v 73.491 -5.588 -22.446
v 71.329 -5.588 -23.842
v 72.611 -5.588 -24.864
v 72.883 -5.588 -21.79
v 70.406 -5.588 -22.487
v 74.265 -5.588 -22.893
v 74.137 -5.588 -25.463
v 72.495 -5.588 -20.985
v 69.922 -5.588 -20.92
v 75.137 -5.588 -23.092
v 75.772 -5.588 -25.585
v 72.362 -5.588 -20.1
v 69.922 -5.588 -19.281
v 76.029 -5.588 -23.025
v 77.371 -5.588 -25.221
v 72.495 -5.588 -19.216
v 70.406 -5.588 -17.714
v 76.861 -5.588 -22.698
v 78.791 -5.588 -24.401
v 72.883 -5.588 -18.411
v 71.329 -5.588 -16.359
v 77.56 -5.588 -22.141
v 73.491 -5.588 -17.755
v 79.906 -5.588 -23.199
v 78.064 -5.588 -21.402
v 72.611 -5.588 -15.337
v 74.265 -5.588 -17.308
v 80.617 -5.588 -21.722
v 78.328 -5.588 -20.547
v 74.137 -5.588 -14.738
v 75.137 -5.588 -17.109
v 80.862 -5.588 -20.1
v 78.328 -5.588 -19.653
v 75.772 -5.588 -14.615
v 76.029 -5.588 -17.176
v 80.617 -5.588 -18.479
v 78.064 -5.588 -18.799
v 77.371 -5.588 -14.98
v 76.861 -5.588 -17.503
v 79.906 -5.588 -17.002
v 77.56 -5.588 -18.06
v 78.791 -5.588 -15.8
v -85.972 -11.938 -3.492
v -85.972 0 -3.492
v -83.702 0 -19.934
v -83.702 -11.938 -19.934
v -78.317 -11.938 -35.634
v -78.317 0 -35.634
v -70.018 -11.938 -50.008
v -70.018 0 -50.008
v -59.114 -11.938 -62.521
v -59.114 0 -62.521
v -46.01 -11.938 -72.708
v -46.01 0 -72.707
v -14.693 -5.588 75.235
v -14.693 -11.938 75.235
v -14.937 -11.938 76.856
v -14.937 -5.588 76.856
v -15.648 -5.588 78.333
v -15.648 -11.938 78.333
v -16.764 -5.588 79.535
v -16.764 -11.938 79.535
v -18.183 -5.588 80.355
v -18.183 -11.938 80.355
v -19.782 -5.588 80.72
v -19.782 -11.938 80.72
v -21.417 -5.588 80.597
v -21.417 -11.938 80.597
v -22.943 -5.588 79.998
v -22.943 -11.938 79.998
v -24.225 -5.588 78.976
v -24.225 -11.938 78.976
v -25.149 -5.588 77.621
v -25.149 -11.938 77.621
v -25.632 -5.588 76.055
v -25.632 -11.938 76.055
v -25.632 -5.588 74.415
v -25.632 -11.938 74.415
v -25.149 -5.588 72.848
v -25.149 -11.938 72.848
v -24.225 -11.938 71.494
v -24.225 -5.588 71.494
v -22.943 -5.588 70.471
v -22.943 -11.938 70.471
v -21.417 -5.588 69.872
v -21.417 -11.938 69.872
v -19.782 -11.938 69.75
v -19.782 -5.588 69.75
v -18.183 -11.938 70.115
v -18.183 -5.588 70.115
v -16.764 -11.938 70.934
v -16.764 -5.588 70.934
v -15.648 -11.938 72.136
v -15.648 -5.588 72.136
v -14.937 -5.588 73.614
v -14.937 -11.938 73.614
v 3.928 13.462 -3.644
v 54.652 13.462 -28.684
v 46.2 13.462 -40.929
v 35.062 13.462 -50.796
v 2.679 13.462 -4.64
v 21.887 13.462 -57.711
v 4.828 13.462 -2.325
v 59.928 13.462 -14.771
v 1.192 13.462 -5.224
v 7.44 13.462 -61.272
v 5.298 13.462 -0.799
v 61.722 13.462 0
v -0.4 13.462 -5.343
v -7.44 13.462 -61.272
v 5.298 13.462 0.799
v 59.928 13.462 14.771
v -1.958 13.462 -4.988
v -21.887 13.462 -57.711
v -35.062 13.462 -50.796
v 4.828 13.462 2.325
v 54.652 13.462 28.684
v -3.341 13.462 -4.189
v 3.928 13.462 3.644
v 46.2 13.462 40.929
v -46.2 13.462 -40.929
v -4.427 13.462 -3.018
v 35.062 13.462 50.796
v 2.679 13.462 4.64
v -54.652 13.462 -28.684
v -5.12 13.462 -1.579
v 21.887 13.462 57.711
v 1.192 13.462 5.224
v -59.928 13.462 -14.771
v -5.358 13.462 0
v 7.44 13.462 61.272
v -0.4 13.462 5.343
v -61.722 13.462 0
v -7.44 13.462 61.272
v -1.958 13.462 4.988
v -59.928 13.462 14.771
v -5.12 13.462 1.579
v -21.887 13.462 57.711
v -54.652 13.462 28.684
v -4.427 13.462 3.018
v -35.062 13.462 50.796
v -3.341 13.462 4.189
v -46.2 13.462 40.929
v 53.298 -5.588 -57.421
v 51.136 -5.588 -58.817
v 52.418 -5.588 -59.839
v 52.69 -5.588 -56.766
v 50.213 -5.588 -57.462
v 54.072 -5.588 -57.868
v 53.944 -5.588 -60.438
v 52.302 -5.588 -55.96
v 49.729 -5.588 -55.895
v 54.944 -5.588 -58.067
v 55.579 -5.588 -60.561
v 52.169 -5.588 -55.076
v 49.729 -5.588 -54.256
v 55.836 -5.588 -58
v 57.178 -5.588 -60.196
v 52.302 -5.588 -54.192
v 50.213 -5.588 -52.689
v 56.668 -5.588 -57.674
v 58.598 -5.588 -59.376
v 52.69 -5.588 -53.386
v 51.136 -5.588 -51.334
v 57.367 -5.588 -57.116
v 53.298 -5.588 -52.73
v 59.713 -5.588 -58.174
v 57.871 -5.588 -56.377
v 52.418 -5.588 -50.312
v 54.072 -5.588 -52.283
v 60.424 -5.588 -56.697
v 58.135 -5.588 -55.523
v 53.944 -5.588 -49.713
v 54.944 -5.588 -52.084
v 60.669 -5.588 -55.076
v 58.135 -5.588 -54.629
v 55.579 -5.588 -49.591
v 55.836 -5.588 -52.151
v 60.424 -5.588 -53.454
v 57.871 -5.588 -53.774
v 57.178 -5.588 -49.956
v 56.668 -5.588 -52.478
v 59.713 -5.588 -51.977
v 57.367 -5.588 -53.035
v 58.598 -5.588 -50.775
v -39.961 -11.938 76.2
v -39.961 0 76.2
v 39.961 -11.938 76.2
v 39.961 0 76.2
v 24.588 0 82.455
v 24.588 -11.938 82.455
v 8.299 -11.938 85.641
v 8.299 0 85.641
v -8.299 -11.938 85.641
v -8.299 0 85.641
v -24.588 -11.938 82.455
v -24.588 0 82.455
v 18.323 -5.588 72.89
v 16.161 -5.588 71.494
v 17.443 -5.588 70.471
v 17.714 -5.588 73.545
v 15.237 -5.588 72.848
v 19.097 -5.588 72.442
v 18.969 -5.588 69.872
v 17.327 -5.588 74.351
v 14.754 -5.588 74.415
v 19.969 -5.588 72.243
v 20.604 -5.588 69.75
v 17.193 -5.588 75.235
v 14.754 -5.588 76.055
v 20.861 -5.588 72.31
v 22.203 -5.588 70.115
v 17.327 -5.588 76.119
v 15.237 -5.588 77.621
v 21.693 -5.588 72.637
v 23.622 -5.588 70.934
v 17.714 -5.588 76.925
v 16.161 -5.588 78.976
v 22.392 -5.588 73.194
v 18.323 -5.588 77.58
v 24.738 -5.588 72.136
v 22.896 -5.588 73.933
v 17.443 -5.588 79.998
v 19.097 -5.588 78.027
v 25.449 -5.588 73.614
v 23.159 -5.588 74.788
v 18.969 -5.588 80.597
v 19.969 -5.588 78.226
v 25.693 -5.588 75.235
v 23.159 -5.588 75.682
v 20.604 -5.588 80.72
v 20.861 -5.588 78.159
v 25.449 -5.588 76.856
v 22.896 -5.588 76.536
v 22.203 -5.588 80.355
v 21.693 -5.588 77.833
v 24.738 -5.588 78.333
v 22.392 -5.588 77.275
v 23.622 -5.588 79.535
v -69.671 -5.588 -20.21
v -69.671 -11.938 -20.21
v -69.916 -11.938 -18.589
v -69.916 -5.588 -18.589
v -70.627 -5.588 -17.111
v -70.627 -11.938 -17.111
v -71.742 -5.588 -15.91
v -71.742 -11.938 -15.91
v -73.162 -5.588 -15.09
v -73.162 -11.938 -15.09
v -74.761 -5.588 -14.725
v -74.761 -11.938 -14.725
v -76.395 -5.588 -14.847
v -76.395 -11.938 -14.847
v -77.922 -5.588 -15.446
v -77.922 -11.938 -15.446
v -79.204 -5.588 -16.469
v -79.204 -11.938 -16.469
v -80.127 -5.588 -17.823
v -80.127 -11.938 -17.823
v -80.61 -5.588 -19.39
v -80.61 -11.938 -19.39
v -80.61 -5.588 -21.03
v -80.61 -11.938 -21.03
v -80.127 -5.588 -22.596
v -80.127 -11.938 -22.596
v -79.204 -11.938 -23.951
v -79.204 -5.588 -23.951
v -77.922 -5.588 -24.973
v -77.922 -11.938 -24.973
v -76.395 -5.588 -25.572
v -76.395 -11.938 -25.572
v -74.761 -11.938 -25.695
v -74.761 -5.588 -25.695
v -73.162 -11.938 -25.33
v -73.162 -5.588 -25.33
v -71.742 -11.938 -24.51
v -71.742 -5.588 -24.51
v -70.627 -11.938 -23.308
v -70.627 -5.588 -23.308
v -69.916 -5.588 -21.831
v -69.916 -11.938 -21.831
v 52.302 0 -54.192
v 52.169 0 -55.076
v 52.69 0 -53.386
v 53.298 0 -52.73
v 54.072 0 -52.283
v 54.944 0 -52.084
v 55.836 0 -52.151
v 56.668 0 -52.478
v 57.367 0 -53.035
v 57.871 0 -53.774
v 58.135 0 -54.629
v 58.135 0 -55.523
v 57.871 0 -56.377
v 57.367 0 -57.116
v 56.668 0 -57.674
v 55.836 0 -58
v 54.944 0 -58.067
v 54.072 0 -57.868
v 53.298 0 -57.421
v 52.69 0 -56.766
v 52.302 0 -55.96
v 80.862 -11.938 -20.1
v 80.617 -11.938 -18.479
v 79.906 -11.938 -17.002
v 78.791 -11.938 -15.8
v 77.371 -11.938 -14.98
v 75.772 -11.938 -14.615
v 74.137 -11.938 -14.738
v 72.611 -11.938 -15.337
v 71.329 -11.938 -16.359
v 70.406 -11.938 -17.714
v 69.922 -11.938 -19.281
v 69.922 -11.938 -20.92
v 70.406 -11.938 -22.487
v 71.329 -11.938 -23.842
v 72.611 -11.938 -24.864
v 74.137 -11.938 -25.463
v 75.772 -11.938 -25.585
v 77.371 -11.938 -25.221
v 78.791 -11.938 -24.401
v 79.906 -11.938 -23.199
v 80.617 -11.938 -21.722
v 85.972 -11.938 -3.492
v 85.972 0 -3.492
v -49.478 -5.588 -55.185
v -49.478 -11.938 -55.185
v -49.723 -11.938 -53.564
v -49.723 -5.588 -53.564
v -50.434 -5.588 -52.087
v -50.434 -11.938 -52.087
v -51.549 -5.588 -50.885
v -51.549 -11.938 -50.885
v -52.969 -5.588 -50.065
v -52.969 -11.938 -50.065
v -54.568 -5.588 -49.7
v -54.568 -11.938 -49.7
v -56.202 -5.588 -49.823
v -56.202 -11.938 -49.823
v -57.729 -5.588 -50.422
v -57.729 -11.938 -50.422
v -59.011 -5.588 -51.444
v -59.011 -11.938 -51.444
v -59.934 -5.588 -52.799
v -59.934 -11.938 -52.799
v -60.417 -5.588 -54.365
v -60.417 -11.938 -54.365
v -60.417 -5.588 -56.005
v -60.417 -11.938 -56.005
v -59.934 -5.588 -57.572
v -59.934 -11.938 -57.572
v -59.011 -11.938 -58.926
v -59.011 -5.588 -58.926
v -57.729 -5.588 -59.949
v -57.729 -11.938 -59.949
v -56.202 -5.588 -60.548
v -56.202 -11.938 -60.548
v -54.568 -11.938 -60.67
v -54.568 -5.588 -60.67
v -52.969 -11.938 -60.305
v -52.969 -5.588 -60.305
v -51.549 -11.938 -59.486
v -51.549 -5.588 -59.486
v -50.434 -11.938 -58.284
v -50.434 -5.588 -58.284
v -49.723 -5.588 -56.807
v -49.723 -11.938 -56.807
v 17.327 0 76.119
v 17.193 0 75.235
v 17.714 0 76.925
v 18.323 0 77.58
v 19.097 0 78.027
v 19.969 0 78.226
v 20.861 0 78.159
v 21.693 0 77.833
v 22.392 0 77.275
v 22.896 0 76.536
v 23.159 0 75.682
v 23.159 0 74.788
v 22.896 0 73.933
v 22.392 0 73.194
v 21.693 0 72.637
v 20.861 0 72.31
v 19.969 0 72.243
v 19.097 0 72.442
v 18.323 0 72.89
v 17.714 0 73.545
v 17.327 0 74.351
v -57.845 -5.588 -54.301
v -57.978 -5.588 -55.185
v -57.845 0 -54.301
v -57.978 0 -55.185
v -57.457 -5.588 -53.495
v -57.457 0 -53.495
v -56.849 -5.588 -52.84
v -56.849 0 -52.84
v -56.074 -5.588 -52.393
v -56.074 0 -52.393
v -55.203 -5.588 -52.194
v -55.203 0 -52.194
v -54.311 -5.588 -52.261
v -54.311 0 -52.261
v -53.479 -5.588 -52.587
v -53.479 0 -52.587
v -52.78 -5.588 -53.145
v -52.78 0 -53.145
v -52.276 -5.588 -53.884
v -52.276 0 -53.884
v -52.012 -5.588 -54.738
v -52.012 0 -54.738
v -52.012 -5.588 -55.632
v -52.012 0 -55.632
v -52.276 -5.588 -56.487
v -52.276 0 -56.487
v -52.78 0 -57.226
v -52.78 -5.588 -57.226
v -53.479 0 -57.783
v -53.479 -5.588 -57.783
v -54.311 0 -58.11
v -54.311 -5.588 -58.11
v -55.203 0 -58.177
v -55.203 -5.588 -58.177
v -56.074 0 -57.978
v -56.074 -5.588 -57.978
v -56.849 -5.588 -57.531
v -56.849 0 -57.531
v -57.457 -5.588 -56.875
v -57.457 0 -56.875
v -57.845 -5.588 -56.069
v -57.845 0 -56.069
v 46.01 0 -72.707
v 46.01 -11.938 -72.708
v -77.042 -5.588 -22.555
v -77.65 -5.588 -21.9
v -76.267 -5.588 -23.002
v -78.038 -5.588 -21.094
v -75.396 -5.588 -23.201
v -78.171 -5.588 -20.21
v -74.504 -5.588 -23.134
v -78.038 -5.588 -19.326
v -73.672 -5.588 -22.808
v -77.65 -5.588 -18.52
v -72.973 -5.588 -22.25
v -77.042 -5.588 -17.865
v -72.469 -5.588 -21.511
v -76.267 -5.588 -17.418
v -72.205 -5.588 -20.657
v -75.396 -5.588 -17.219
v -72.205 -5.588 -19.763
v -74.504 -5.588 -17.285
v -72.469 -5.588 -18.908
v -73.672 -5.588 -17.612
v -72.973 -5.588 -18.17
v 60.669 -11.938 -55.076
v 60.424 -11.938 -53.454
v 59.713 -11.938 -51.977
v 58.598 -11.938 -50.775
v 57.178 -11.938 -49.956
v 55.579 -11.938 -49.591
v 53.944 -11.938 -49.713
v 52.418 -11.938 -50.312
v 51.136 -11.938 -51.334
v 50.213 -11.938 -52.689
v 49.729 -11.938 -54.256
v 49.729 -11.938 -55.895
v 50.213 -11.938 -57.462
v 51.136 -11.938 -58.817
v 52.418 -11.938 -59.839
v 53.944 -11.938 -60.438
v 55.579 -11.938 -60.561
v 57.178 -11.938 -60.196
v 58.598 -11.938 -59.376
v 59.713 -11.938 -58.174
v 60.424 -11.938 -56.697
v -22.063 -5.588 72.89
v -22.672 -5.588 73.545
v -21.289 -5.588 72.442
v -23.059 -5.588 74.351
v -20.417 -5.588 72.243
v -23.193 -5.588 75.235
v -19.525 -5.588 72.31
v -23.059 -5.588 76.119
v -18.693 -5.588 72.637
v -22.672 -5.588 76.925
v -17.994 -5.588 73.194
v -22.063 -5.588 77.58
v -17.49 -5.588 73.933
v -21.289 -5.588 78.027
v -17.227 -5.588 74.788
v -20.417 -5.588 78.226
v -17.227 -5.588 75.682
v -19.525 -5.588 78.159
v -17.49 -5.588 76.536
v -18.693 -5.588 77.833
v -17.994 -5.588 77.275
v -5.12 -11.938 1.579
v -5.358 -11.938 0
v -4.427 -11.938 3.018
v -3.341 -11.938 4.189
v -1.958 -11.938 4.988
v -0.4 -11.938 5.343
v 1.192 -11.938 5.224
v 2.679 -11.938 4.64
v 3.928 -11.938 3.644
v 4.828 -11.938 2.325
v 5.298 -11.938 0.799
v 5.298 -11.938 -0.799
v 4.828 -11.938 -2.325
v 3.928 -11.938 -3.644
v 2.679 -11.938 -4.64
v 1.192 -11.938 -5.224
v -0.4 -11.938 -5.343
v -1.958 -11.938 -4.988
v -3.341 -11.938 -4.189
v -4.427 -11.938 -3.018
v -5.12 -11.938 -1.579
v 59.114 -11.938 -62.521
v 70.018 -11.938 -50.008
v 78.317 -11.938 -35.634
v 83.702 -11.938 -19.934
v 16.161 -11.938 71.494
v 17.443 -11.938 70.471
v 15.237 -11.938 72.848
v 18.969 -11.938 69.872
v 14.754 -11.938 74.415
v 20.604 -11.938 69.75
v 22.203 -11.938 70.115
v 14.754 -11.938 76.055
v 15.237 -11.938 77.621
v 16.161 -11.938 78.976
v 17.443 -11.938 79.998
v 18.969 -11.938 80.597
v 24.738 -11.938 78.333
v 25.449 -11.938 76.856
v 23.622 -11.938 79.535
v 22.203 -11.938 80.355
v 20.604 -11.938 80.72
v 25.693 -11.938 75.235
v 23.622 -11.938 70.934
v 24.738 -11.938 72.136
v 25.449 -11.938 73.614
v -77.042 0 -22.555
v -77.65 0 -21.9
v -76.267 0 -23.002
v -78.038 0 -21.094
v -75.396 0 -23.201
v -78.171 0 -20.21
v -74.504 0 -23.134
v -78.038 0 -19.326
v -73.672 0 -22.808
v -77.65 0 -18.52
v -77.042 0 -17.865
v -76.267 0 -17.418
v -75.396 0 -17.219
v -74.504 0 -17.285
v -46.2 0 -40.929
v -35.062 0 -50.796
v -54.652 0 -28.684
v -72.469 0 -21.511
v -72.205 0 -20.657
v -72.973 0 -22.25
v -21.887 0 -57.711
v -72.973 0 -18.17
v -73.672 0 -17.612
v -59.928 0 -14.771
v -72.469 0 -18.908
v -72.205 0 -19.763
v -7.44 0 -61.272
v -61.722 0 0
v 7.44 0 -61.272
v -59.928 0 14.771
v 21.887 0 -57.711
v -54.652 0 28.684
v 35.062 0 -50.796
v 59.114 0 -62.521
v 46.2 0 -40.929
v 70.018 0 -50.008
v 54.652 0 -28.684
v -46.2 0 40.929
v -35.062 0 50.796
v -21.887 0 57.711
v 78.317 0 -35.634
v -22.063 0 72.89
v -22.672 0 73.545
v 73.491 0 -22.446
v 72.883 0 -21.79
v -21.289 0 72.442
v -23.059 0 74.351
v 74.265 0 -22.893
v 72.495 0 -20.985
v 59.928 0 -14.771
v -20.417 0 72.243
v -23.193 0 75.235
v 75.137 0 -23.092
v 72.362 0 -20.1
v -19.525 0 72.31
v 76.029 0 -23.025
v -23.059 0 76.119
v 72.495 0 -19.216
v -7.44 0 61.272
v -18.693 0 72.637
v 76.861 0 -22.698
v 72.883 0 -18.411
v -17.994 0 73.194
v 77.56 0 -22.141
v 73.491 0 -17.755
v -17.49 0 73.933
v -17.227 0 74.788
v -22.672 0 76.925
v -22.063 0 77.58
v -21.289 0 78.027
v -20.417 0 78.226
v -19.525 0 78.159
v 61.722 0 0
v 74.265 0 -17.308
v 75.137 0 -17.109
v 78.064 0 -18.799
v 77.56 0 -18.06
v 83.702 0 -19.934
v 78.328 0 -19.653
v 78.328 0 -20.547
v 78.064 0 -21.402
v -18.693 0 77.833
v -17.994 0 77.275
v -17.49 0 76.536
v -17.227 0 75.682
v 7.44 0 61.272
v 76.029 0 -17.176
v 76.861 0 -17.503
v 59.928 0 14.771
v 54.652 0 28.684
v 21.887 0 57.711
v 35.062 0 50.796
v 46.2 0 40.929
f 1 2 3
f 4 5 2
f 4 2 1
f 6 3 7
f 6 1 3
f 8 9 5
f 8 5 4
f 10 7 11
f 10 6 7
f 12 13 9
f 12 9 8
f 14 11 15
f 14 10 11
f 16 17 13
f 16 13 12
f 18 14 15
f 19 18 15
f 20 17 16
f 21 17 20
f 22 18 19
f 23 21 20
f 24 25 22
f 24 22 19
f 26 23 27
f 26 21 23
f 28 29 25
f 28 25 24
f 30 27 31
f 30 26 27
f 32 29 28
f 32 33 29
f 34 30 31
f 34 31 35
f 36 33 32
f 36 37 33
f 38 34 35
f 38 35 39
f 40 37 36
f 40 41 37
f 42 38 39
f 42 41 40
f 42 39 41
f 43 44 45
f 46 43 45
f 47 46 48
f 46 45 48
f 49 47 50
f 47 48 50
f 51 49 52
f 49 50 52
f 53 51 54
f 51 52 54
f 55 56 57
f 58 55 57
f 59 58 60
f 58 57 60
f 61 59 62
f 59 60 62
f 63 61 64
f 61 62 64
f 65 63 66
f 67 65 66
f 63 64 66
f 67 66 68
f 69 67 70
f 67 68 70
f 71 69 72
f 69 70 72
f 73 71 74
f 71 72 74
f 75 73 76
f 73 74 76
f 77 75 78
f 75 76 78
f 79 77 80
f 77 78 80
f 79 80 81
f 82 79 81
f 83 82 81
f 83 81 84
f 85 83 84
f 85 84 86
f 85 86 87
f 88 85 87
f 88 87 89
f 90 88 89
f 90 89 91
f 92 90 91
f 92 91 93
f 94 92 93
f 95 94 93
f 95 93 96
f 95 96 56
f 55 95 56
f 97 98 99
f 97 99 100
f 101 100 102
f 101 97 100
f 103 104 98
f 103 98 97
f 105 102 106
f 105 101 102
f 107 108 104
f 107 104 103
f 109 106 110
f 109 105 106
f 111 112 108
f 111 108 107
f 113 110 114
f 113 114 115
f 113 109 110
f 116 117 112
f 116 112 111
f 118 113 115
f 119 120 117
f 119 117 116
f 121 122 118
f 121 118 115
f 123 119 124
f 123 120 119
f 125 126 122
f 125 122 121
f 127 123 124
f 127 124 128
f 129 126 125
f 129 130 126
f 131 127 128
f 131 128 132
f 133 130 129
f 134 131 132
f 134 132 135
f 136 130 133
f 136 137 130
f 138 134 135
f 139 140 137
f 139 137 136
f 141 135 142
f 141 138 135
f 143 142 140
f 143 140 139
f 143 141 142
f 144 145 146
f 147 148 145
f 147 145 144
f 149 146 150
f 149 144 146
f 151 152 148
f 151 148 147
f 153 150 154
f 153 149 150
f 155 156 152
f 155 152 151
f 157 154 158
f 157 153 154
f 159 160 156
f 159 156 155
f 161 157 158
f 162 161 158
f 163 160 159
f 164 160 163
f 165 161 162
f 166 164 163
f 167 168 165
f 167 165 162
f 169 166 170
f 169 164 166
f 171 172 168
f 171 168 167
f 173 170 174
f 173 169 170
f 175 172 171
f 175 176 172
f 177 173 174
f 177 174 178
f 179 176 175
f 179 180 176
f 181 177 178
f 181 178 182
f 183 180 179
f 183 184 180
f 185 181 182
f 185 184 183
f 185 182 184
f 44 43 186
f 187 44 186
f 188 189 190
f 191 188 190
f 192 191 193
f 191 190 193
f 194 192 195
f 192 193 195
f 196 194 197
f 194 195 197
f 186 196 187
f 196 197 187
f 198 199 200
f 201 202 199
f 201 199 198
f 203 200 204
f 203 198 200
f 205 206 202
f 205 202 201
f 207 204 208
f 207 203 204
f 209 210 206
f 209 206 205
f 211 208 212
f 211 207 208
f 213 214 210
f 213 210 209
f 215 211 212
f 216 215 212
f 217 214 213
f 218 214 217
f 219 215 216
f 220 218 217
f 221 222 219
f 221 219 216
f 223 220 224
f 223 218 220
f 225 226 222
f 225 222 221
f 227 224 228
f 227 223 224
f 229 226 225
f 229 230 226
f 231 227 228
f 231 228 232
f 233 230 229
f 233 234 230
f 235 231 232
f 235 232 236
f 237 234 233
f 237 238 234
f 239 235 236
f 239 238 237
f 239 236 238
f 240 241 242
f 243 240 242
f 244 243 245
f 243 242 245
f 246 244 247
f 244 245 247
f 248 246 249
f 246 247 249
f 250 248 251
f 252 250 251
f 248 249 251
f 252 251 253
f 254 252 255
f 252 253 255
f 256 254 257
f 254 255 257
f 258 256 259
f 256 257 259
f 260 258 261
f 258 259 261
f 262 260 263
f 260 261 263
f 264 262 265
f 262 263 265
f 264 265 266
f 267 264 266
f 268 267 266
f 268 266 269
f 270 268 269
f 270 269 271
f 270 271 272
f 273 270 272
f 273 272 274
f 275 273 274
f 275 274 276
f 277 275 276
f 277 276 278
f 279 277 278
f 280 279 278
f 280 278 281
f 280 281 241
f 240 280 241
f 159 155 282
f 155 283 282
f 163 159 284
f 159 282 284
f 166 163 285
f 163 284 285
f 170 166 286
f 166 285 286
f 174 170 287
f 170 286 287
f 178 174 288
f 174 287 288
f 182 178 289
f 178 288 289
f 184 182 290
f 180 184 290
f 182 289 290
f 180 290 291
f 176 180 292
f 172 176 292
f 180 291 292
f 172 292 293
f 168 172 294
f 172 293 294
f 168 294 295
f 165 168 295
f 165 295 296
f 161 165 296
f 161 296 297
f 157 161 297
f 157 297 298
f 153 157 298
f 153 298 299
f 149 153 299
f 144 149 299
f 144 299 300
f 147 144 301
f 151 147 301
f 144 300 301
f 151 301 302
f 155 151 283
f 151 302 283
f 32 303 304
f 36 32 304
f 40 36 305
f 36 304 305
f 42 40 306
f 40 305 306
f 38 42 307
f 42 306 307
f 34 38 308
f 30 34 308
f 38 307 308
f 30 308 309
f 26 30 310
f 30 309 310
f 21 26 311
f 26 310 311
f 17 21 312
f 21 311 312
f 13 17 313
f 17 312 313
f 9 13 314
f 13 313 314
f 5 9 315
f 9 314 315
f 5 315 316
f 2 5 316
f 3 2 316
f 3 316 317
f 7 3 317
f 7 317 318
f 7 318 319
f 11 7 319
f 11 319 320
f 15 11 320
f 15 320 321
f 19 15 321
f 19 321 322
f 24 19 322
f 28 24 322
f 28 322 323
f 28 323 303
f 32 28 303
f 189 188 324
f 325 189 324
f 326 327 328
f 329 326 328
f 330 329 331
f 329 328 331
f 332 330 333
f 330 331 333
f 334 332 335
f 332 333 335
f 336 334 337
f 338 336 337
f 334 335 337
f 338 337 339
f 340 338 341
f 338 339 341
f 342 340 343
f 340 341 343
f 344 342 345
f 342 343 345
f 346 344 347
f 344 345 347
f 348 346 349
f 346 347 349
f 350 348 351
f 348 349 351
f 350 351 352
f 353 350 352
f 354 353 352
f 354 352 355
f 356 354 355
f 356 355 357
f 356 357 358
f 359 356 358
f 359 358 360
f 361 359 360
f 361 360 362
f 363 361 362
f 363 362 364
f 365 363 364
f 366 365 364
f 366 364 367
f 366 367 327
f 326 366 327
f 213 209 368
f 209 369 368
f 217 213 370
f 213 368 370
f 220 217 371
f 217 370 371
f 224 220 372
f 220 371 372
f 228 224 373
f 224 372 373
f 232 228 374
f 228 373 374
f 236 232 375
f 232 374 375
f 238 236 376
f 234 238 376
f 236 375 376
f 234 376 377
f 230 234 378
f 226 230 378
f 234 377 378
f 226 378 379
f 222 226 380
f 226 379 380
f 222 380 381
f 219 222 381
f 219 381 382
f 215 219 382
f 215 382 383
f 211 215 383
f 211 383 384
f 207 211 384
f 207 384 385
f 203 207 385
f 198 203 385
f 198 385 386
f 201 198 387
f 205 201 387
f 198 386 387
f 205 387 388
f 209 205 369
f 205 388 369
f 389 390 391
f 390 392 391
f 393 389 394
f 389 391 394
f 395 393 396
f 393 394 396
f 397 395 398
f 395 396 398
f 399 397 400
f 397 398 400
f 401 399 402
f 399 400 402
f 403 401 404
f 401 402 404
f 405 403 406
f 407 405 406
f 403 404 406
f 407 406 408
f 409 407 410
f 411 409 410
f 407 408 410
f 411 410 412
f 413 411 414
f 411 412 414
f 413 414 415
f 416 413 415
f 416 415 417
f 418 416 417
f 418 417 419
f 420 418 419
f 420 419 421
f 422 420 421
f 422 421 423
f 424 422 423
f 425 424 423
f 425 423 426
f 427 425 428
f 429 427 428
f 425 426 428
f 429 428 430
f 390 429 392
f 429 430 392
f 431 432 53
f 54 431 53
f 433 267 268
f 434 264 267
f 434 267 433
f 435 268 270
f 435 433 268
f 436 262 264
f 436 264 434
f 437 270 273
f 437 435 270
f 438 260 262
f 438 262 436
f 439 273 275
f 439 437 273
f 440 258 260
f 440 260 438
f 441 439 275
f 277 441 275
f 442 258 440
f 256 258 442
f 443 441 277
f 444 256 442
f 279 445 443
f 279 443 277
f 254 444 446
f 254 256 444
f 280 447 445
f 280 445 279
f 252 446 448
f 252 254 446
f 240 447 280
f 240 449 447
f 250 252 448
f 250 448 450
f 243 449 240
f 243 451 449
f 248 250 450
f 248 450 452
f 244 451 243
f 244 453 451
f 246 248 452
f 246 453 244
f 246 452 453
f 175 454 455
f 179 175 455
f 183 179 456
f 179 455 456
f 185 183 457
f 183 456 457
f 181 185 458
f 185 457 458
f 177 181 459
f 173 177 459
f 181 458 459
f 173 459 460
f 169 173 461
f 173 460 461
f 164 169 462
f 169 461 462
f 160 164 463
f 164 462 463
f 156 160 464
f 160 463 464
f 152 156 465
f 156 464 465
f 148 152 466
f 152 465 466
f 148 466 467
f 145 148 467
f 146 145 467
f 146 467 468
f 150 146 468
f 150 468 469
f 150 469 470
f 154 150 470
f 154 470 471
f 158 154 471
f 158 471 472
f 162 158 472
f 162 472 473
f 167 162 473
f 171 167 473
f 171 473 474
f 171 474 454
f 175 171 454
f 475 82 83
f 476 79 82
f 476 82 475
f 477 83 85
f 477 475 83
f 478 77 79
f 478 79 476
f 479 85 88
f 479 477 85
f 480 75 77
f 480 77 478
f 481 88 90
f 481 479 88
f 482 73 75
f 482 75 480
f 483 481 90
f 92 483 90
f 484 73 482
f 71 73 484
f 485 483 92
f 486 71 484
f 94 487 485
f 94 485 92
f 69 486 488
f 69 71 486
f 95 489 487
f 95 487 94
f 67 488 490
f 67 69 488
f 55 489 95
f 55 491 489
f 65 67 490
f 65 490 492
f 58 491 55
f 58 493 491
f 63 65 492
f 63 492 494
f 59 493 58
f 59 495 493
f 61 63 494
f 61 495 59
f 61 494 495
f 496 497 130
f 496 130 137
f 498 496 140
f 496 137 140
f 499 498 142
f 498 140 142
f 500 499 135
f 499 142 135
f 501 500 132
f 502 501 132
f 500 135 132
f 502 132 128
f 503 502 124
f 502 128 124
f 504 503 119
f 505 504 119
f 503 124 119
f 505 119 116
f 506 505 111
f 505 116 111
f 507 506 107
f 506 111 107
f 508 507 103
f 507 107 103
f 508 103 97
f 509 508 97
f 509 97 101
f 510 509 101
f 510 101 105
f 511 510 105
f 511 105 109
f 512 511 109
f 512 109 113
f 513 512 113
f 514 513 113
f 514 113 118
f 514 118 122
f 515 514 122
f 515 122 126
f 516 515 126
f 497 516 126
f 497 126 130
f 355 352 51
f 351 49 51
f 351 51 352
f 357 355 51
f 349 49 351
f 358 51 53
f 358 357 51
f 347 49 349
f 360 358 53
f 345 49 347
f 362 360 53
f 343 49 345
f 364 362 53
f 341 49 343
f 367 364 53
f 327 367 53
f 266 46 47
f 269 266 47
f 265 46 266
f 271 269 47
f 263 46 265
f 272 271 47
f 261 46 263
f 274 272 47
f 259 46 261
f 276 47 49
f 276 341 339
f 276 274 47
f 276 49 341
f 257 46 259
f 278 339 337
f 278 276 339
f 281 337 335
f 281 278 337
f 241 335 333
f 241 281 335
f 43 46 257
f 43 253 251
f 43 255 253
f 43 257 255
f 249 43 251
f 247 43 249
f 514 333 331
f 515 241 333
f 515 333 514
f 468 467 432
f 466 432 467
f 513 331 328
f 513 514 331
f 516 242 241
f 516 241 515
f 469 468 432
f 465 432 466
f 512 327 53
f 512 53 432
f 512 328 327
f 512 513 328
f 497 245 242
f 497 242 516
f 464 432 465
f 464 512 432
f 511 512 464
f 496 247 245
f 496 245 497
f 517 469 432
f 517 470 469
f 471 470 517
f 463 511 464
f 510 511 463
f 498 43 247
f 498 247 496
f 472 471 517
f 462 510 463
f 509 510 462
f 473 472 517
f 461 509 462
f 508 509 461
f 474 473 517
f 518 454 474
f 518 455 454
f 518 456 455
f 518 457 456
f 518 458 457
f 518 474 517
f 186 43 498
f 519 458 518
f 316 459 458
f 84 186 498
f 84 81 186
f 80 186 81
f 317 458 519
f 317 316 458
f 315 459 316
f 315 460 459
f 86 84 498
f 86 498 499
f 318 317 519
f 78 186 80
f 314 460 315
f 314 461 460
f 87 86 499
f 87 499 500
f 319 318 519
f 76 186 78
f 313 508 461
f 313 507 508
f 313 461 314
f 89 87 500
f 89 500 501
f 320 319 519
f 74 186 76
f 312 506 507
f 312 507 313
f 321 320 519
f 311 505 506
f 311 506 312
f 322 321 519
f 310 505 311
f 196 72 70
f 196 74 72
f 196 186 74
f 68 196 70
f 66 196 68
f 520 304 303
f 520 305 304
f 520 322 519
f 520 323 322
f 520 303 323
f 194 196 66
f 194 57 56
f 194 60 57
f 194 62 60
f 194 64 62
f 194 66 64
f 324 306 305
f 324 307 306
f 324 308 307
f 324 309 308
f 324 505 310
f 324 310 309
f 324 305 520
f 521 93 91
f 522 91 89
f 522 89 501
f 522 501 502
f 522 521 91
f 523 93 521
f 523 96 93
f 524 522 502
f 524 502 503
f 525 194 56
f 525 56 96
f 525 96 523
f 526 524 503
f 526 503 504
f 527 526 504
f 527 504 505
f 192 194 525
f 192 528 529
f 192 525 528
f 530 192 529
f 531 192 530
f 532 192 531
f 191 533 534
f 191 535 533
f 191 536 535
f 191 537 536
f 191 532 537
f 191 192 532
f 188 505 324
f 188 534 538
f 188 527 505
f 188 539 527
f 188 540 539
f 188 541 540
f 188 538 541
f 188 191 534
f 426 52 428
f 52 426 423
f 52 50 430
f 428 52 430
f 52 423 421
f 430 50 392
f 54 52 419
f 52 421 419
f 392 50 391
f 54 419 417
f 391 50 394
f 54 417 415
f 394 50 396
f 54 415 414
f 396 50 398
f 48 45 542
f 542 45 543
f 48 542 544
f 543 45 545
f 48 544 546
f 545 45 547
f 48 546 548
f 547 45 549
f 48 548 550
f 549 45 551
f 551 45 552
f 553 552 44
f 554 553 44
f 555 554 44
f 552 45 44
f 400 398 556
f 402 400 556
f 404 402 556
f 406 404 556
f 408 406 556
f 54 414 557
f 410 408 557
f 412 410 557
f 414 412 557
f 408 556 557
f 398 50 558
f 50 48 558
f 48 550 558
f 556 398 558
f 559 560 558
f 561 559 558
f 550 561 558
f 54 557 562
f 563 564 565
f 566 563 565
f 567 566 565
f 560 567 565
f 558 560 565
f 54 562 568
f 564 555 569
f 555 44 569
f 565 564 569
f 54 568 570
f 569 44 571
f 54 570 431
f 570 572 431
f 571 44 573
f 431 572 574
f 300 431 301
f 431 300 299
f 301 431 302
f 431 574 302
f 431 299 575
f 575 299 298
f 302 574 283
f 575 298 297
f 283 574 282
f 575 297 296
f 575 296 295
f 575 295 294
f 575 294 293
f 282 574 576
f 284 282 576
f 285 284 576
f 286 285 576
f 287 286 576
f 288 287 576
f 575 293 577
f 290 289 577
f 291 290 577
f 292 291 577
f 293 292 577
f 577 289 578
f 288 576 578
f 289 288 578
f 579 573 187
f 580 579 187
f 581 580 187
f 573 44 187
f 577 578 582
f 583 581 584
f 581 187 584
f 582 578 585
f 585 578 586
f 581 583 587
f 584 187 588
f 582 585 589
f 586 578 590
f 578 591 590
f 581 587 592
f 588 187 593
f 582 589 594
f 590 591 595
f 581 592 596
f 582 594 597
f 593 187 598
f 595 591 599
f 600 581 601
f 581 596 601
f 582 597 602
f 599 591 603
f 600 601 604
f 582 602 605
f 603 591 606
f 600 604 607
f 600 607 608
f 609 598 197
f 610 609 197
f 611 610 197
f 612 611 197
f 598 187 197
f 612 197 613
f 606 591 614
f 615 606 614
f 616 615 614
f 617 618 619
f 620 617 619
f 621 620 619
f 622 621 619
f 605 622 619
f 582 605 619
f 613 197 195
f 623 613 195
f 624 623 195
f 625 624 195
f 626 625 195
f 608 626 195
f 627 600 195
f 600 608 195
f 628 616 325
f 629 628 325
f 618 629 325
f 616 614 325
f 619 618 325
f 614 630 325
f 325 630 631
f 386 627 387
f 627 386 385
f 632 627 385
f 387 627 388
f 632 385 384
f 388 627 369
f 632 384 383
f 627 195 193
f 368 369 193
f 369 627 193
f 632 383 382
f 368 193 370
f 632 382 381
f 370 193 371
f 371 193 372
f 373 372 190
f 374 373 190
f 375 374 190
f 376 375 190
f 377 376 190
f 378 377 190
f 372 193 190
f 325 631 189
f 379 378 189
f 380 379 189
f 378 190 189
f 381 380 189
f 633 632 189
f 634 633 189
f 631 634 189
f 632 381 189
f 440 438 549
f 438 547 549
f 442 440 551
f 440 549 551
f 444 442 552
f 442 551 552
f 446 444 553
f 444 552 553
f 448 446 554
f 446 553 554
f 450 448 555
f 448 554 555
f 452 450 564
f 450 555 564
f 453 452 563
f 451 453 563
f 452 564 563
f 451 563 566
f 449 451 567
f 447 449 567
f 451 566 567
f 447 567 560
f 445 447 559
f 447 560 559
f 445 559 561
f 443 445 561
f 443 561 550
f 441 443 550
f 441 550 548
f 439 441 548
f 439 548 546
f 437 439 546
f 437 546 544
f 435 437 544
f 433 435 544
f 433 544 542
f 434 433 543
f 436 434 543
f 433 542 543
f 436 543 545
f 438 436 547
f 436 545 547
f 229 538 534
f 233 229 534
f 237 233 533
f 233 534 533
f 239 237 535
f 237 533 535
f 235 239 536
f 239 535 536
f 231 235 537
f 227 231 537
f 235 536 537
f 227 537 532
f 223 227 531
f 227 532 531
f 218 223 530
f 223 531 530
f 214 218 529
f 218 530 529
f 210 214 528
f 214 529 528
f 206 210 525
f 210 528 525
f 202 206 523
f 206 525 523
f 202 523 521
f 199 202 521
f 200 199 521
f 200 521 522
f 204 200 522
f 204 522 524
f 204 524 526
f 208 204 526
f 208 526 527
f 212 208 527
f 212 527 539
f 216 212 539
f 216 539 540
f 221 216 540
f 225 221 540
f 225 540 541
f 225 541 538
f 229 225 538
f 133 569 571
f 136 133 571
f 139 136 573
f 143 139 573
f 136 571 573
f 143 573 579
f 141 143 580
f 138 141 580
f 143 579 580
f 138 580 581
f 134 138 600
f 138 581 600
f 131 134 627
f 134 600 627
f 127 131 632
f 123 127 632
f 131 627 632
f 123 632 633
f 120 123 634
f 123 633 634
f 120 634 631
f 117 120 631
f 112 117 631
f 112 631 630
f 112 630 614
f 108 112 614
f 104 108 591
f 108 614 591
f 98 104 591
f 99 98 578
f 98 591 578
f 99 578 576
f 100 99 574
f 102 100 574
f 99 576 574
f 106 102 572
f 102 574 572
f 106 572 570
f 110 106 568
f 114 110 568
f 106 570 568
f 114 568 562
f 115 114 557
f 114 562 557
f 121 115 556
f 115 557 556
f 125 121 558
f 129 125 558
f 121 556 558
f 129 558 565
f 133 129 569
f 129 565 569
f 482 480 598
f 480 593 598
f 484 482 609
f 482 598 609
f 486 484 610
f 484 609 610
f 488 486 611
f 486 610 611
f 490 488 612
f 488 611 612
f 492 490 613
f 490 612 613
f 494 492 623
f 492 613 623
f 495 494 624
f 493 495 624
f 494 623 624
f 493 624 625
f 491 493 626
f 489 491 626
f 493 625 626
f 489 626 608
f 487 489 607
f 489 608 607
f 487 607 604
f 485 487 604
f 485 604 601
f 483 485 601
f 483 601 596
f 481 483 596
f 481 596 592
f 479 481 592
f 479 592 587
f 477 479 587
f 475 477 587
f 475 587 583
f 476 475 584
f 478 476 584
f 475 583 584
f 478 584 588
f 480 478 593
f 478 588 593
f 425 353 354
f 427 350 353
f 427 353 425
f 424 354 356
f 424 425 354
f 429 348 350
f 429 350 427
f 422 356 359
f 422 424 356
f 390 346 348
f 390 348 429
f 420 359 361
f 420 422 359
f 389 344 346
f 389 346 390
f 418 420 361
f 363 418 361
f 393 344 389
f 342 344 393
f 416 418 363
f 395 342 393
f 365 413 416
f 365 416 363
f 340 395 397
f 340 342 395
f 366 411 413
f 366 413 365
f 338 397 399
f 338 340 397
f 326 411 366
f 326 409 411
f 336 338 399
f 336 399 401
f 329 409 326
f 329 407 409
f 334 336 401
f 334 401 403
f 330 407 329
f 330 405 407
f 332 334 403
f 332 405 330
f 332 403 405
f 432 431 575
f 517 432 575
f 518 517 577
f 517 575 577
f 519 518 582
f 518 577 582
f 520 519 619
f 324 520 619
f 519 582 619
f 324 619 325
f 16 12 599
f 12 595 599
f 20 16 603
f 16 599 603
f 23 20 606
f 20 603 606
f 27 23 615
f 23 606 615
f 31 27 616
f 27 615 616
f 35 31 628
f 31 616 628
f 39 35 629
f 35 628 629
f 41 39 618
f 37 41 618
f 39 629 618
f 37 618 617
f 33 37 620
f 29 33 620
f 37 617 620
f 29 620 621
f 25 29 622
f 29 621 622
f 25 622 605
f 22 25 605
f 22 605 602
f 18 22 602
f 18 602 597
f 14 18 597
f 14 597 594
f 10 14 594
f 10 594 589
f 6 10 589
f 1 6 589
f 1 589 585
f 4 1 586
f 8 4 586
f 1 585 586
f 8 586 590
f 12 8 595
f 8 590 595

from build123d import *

# Parameters (mm, degrees)
F0_R           = 86.0425
F1_DEPTH       = 11.938
F2_R           = 61.722
F3_DEPTH       = 13.462
F5_DEPTH       = 25.401
F7_D           = 5.99948
F7_CBORE_D     = 11.00074
F7_CBORE_DEPTH = 6.35
F9_D           = 10.71626


with BuildPart() as f1:
    # F0 (on Front) → F1 (new body)
    with BuildSketch(Plane.XZ):
        Circle(F0_R)
    extrude(amount=F1_DEPTH)

    # F2 (on face) → F3 (join)
    with BuildSketch(Plane(origin=(0, 0, 0), x_dir=(-1, 0, 0), z_dir=(0, 1, 0))):
        Circle(F2_R)
    extrude(amount=F3_DEPTH)

    # F4 (on face) → F5 (cut, through all)
    with BuildSketch(Plane.XZ.offset(11.938)):
        with BuildLine():
            Line((-85.9716026302, -3.4921837637), (-39.9614814611, 76.1996837637))
            ThreePointArc((-39.9614814611, 76.1996837637), (-74.5149908051, 43.02125), (-85.9716026302, -3.4921837637))
        make_face()
        with BuildLine():
            ThreePointArc((86.0425, 0), (73.6264136532, 44.5248584368), (39.9614814611, 76.1996837637))
            Line((39.9614814611, 76.1996837637), (85.9716026302, -3.4921837637))
            ThreePointArc((85.9716026302, -3.4921837637), (86.0247738316, -1.7464516796), (86.0425, 0))
        make_face()
        with BuildLine():
            ThreePointArc((-46.0101211692, -72.7075), (0, -86.0425), (46.0101211692, -72.7075))
            Line((46.0101211692, -72.7075), (-46.0101211692, -72.7075))
        make_face()
    extrude(amount=-F5_DEPTH, mode=Mode.SUBTRACT)

    # F7 (through all)
    with Locations(Plane.XZ.offset(11.938)):
        with Locations((20.193, 75.2348), (-20.193, 75.2348), (-75.1715490214, -20.2099480486), (-54.9785490214, -55.1852500059), (55.1683019572, -55.0756960973), (75.3613019572, -20.10039414)):
            CounterBoreHole(F7_D / 2, F7_CBORE_D / 2, F7_CBORE_DEPTH)

    # F9 (through all)
    with Locations(Plane.XZ.offset(11.938)):
        with Locations((0, 0)):
            Hole(F9_D / 2)


solid = f1.part
